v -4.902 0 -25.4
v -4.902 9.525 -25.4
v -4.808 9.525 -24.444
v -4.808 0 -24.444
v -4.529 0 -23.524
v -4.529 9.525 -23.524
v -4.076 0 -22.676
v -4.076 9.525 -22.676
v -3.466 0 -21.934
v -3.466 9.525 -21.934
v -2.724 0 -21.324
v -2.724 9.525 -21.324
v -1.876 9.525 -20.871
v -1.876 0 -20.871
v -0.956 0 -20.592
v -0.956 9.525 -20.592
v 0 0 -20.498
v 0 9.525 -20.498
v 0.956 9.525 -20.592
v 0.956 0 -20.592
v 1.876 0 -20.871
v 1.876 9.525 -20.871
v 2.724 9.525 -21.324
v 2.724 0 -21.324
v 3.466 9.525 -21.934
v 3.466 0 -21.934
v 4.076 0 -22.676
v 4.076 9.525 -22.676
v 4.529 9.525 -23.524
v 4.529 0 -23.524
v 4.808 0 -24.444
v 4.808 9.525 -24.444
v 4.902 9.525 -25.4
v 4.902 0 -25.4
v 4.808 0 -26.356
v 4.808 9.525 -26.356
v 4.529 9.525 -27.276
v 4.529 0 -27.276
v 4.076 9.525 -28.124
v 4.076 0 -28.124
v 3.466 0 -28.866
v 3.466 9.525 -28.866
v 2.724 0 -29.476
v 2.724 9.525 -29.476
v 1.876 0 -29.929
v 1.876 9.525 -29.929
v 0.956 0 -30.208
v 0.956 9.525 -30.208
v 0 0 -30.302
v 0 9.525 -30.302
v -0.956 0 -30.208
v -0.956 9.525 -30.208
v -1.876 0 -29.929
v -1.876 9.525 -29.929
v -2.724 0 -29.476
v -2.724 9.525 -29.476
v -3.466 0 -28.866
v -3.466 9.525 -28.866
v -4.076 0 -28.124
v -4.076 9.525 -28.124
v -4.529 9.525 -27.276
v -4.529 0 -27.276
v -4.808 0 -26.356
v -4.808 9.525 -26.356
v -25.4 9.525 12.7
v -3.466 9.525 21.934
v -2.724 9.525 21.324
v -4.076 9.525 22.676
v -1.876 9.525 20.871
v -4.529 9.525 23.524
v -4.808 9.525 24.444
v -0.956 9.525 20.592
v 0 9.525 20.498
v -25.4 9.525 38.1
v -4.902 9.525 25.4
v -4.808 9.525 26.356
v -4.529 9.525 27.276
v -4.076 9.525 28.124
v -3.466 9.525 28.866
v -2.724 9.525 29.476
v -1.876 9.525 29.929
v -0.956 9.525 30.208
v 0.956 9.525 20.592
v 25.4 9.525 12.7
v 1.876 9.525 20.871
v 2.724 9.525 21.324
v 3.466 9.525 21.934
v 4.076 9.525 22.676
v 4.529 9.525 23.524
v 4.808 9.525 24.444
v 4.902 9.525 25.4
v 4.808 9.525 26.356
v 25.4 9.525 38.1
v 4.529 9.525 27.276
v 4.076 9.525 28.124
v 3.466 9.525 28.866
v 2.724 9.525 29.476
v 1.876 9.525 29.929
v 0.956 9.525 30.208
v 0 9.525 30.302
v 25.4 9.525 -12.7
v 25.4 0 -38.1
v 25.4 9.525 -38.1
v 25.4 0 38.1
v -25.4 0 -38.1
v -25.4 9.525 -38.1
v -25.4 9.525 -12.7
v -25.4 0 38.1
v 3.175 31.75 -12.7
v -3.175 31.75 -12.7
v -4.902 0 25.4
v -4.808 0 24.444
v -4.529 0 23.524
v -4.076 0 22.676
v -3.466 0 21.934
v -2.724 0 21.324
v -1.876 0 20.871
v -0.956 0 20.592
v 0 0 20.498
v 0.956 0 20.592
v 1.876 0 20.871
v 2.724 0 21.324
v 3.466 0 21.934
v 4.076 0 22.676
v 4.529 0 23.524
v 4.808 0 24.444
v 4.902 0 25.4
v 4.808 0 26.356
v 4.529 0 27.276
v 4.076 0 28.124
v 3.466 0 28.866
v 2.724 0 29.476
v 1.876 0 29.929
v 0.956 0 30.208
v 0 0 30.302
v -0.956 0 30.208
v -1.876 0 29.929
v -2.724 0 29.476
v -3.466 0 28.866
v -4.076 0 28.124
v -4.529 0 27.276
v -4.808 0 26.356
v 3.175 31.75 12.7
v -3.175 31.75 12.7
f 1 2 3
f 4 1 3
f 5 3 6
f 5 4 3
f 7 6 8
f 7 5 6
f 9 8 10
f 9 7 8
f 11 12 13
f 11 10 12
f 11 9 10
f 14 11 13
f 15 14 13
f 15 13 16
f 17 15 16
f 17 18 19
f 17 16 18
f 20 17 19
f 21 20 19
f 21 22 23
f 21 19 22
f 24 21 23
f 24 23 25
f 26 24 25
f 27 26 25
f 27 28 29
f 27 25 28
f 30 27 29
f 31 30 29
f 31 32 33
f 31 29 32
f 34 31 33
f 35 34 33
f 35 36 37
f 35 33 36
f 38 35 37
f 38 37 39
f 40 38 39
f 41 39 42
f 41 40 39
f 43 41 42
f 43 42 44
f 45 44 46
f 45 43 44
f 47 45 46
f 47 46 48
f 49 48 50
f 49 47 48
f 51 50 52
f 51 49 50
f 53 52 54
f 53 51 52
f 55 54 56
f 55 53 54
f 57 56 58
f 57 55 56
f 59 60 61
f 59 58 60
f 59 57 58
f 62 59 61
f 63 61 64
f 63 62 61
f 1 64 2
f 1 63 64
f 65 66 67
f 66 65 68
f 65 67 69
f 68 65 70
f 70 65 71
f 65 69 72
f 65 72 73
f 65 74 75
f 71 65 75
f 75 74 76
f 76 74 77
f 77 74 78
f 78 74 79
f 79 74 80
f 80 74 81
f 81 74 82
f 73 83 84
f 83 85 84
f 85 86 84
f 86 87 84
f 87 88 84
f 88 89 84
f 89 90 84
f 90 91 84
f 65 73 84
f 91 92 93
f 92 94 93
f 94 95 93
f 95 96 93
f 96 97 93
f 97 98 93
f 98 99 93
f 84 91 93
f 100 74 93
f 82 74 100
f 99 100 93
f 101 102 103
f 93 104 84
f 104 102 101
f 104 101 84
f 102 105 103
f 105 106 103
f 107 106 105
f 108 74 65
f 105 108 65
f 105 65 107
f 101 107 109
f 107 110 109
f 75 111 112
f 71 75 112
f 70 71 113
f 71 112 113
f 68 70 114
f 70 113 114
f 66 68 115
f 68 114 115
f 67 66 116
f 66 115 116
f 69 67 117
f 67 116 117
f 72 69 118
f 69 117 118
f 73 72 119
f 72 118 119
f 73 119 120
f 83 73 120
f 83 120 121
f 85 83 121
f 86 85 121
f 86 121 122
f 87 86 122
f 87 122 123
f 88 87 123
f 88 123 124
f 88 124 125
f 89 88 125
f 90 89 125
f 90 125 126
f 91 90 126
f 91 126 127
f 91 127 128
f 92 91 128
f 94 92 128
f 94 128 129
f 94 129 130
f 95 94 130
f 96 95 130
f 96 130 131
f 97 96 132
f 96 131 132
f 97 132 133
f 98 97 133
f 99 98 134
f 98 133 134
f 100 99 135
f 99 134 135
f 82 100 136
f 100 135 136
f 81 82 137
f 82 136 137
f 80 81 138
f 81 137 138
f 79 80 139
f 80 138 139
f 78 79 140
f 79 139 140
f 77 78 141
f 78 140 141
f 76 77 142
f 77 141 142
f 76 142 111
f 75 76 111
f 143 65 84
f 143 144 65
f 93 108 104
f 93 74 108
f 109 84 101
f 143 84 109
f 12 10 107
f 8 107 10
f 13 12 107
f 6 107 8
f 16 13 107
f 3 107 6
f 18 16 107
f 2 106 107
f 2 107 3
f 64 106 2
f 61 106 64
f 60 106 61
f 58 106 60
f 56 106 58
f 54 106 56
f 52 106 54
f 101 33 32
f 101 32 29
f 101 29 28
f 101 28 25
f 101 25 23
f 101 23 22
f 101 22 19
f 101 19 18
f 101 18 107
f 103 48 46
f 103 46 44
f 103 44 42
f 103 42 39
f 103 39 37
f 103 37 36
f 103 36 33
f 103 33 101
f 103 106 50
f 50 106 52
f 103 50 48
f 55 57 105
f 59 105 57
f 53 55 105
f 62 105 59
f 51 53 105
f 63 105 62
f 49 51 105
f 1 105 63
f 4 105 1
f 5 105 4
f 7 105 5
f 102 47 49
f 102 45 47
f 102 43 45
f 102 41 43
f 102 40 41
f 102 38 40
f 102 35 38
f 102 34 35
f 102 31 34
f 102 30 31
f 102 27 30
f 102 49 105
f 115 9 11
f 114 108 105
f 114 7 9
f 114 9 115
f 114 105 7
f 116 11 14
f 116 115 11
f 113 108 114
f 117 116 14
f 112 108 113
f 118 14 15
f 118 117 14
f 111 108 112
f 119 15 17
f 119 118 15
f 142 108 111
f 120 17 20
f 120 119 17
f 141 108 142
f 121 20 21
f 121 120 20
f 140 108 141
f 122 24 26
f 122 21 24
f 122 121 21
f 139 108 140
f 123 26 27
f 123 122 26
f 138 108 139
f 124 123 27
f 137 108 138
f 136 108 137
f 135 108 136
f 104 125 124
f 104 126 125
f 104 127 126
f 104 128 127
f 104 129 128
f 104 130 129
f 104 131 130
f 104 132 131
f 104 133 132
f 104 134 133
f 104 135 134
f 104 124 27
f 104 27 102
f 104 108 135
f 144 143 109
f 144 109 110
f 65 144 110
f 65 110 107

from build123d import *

# Parameters (mm, degrees)
BOSS_EXTRUDE1_DEPTH     = 38.1
CUT_EXTRUDE2_DEPTH      = 25.4
F_3_8_CLEARANCE_HOLE2_D = 9.8044


with BuildPart() as part:
    # Sketch1 → Boss-Extrude1 (new, symmetric)
    with BuildSketch(Plane.XY):
        Polygon((0, 0), (25.4, 0), (25.4, 9.525), (3.175, 31.75), (-3.175, 31.75), (-25.4, 9.525), (-25.4, 0), align=None)
    extrude(amount=BOSS_EXTRUDE1_DEPTH, both=True)

    # Sketch6 → Cut-Extrude2 (cut)
    with BuildSketch(Plane.XY.offset(38.1)):
        Polygon((-25.4, 9.525), (25.4, 9.525), (3.175, 31.75), (-3.175, 31.75), align=None)
    cut_extrude2 = extrude(amount=-CUT_EXTRUDE2_DEPTH, mode=Mode.SUBTRACT)

    # 3/8 Clearance Hole2 (through all)
    with Locations(Plane(origin=(0, 9.525, 0), x_dir=(1, 0, 0), z_dir=(0, 1, 0))):
        with Locations((0, -25.4)):
            f_3_8_clearance_hole2 = Hole(F_3_8_CLEARANCE_HOLE2_D / 2)

    # Mirror2: Cut-Extrude2, 3/8 Clearance Hole2 across plane
    add(cut_extrude2.mirror(Plane.XY), mode=Mode.SUBTRACT)
    add(f_3_8_clearance_hole2.mirror(Plane.XY), mode=Mode.SUBTRACT)


solid = part.part
